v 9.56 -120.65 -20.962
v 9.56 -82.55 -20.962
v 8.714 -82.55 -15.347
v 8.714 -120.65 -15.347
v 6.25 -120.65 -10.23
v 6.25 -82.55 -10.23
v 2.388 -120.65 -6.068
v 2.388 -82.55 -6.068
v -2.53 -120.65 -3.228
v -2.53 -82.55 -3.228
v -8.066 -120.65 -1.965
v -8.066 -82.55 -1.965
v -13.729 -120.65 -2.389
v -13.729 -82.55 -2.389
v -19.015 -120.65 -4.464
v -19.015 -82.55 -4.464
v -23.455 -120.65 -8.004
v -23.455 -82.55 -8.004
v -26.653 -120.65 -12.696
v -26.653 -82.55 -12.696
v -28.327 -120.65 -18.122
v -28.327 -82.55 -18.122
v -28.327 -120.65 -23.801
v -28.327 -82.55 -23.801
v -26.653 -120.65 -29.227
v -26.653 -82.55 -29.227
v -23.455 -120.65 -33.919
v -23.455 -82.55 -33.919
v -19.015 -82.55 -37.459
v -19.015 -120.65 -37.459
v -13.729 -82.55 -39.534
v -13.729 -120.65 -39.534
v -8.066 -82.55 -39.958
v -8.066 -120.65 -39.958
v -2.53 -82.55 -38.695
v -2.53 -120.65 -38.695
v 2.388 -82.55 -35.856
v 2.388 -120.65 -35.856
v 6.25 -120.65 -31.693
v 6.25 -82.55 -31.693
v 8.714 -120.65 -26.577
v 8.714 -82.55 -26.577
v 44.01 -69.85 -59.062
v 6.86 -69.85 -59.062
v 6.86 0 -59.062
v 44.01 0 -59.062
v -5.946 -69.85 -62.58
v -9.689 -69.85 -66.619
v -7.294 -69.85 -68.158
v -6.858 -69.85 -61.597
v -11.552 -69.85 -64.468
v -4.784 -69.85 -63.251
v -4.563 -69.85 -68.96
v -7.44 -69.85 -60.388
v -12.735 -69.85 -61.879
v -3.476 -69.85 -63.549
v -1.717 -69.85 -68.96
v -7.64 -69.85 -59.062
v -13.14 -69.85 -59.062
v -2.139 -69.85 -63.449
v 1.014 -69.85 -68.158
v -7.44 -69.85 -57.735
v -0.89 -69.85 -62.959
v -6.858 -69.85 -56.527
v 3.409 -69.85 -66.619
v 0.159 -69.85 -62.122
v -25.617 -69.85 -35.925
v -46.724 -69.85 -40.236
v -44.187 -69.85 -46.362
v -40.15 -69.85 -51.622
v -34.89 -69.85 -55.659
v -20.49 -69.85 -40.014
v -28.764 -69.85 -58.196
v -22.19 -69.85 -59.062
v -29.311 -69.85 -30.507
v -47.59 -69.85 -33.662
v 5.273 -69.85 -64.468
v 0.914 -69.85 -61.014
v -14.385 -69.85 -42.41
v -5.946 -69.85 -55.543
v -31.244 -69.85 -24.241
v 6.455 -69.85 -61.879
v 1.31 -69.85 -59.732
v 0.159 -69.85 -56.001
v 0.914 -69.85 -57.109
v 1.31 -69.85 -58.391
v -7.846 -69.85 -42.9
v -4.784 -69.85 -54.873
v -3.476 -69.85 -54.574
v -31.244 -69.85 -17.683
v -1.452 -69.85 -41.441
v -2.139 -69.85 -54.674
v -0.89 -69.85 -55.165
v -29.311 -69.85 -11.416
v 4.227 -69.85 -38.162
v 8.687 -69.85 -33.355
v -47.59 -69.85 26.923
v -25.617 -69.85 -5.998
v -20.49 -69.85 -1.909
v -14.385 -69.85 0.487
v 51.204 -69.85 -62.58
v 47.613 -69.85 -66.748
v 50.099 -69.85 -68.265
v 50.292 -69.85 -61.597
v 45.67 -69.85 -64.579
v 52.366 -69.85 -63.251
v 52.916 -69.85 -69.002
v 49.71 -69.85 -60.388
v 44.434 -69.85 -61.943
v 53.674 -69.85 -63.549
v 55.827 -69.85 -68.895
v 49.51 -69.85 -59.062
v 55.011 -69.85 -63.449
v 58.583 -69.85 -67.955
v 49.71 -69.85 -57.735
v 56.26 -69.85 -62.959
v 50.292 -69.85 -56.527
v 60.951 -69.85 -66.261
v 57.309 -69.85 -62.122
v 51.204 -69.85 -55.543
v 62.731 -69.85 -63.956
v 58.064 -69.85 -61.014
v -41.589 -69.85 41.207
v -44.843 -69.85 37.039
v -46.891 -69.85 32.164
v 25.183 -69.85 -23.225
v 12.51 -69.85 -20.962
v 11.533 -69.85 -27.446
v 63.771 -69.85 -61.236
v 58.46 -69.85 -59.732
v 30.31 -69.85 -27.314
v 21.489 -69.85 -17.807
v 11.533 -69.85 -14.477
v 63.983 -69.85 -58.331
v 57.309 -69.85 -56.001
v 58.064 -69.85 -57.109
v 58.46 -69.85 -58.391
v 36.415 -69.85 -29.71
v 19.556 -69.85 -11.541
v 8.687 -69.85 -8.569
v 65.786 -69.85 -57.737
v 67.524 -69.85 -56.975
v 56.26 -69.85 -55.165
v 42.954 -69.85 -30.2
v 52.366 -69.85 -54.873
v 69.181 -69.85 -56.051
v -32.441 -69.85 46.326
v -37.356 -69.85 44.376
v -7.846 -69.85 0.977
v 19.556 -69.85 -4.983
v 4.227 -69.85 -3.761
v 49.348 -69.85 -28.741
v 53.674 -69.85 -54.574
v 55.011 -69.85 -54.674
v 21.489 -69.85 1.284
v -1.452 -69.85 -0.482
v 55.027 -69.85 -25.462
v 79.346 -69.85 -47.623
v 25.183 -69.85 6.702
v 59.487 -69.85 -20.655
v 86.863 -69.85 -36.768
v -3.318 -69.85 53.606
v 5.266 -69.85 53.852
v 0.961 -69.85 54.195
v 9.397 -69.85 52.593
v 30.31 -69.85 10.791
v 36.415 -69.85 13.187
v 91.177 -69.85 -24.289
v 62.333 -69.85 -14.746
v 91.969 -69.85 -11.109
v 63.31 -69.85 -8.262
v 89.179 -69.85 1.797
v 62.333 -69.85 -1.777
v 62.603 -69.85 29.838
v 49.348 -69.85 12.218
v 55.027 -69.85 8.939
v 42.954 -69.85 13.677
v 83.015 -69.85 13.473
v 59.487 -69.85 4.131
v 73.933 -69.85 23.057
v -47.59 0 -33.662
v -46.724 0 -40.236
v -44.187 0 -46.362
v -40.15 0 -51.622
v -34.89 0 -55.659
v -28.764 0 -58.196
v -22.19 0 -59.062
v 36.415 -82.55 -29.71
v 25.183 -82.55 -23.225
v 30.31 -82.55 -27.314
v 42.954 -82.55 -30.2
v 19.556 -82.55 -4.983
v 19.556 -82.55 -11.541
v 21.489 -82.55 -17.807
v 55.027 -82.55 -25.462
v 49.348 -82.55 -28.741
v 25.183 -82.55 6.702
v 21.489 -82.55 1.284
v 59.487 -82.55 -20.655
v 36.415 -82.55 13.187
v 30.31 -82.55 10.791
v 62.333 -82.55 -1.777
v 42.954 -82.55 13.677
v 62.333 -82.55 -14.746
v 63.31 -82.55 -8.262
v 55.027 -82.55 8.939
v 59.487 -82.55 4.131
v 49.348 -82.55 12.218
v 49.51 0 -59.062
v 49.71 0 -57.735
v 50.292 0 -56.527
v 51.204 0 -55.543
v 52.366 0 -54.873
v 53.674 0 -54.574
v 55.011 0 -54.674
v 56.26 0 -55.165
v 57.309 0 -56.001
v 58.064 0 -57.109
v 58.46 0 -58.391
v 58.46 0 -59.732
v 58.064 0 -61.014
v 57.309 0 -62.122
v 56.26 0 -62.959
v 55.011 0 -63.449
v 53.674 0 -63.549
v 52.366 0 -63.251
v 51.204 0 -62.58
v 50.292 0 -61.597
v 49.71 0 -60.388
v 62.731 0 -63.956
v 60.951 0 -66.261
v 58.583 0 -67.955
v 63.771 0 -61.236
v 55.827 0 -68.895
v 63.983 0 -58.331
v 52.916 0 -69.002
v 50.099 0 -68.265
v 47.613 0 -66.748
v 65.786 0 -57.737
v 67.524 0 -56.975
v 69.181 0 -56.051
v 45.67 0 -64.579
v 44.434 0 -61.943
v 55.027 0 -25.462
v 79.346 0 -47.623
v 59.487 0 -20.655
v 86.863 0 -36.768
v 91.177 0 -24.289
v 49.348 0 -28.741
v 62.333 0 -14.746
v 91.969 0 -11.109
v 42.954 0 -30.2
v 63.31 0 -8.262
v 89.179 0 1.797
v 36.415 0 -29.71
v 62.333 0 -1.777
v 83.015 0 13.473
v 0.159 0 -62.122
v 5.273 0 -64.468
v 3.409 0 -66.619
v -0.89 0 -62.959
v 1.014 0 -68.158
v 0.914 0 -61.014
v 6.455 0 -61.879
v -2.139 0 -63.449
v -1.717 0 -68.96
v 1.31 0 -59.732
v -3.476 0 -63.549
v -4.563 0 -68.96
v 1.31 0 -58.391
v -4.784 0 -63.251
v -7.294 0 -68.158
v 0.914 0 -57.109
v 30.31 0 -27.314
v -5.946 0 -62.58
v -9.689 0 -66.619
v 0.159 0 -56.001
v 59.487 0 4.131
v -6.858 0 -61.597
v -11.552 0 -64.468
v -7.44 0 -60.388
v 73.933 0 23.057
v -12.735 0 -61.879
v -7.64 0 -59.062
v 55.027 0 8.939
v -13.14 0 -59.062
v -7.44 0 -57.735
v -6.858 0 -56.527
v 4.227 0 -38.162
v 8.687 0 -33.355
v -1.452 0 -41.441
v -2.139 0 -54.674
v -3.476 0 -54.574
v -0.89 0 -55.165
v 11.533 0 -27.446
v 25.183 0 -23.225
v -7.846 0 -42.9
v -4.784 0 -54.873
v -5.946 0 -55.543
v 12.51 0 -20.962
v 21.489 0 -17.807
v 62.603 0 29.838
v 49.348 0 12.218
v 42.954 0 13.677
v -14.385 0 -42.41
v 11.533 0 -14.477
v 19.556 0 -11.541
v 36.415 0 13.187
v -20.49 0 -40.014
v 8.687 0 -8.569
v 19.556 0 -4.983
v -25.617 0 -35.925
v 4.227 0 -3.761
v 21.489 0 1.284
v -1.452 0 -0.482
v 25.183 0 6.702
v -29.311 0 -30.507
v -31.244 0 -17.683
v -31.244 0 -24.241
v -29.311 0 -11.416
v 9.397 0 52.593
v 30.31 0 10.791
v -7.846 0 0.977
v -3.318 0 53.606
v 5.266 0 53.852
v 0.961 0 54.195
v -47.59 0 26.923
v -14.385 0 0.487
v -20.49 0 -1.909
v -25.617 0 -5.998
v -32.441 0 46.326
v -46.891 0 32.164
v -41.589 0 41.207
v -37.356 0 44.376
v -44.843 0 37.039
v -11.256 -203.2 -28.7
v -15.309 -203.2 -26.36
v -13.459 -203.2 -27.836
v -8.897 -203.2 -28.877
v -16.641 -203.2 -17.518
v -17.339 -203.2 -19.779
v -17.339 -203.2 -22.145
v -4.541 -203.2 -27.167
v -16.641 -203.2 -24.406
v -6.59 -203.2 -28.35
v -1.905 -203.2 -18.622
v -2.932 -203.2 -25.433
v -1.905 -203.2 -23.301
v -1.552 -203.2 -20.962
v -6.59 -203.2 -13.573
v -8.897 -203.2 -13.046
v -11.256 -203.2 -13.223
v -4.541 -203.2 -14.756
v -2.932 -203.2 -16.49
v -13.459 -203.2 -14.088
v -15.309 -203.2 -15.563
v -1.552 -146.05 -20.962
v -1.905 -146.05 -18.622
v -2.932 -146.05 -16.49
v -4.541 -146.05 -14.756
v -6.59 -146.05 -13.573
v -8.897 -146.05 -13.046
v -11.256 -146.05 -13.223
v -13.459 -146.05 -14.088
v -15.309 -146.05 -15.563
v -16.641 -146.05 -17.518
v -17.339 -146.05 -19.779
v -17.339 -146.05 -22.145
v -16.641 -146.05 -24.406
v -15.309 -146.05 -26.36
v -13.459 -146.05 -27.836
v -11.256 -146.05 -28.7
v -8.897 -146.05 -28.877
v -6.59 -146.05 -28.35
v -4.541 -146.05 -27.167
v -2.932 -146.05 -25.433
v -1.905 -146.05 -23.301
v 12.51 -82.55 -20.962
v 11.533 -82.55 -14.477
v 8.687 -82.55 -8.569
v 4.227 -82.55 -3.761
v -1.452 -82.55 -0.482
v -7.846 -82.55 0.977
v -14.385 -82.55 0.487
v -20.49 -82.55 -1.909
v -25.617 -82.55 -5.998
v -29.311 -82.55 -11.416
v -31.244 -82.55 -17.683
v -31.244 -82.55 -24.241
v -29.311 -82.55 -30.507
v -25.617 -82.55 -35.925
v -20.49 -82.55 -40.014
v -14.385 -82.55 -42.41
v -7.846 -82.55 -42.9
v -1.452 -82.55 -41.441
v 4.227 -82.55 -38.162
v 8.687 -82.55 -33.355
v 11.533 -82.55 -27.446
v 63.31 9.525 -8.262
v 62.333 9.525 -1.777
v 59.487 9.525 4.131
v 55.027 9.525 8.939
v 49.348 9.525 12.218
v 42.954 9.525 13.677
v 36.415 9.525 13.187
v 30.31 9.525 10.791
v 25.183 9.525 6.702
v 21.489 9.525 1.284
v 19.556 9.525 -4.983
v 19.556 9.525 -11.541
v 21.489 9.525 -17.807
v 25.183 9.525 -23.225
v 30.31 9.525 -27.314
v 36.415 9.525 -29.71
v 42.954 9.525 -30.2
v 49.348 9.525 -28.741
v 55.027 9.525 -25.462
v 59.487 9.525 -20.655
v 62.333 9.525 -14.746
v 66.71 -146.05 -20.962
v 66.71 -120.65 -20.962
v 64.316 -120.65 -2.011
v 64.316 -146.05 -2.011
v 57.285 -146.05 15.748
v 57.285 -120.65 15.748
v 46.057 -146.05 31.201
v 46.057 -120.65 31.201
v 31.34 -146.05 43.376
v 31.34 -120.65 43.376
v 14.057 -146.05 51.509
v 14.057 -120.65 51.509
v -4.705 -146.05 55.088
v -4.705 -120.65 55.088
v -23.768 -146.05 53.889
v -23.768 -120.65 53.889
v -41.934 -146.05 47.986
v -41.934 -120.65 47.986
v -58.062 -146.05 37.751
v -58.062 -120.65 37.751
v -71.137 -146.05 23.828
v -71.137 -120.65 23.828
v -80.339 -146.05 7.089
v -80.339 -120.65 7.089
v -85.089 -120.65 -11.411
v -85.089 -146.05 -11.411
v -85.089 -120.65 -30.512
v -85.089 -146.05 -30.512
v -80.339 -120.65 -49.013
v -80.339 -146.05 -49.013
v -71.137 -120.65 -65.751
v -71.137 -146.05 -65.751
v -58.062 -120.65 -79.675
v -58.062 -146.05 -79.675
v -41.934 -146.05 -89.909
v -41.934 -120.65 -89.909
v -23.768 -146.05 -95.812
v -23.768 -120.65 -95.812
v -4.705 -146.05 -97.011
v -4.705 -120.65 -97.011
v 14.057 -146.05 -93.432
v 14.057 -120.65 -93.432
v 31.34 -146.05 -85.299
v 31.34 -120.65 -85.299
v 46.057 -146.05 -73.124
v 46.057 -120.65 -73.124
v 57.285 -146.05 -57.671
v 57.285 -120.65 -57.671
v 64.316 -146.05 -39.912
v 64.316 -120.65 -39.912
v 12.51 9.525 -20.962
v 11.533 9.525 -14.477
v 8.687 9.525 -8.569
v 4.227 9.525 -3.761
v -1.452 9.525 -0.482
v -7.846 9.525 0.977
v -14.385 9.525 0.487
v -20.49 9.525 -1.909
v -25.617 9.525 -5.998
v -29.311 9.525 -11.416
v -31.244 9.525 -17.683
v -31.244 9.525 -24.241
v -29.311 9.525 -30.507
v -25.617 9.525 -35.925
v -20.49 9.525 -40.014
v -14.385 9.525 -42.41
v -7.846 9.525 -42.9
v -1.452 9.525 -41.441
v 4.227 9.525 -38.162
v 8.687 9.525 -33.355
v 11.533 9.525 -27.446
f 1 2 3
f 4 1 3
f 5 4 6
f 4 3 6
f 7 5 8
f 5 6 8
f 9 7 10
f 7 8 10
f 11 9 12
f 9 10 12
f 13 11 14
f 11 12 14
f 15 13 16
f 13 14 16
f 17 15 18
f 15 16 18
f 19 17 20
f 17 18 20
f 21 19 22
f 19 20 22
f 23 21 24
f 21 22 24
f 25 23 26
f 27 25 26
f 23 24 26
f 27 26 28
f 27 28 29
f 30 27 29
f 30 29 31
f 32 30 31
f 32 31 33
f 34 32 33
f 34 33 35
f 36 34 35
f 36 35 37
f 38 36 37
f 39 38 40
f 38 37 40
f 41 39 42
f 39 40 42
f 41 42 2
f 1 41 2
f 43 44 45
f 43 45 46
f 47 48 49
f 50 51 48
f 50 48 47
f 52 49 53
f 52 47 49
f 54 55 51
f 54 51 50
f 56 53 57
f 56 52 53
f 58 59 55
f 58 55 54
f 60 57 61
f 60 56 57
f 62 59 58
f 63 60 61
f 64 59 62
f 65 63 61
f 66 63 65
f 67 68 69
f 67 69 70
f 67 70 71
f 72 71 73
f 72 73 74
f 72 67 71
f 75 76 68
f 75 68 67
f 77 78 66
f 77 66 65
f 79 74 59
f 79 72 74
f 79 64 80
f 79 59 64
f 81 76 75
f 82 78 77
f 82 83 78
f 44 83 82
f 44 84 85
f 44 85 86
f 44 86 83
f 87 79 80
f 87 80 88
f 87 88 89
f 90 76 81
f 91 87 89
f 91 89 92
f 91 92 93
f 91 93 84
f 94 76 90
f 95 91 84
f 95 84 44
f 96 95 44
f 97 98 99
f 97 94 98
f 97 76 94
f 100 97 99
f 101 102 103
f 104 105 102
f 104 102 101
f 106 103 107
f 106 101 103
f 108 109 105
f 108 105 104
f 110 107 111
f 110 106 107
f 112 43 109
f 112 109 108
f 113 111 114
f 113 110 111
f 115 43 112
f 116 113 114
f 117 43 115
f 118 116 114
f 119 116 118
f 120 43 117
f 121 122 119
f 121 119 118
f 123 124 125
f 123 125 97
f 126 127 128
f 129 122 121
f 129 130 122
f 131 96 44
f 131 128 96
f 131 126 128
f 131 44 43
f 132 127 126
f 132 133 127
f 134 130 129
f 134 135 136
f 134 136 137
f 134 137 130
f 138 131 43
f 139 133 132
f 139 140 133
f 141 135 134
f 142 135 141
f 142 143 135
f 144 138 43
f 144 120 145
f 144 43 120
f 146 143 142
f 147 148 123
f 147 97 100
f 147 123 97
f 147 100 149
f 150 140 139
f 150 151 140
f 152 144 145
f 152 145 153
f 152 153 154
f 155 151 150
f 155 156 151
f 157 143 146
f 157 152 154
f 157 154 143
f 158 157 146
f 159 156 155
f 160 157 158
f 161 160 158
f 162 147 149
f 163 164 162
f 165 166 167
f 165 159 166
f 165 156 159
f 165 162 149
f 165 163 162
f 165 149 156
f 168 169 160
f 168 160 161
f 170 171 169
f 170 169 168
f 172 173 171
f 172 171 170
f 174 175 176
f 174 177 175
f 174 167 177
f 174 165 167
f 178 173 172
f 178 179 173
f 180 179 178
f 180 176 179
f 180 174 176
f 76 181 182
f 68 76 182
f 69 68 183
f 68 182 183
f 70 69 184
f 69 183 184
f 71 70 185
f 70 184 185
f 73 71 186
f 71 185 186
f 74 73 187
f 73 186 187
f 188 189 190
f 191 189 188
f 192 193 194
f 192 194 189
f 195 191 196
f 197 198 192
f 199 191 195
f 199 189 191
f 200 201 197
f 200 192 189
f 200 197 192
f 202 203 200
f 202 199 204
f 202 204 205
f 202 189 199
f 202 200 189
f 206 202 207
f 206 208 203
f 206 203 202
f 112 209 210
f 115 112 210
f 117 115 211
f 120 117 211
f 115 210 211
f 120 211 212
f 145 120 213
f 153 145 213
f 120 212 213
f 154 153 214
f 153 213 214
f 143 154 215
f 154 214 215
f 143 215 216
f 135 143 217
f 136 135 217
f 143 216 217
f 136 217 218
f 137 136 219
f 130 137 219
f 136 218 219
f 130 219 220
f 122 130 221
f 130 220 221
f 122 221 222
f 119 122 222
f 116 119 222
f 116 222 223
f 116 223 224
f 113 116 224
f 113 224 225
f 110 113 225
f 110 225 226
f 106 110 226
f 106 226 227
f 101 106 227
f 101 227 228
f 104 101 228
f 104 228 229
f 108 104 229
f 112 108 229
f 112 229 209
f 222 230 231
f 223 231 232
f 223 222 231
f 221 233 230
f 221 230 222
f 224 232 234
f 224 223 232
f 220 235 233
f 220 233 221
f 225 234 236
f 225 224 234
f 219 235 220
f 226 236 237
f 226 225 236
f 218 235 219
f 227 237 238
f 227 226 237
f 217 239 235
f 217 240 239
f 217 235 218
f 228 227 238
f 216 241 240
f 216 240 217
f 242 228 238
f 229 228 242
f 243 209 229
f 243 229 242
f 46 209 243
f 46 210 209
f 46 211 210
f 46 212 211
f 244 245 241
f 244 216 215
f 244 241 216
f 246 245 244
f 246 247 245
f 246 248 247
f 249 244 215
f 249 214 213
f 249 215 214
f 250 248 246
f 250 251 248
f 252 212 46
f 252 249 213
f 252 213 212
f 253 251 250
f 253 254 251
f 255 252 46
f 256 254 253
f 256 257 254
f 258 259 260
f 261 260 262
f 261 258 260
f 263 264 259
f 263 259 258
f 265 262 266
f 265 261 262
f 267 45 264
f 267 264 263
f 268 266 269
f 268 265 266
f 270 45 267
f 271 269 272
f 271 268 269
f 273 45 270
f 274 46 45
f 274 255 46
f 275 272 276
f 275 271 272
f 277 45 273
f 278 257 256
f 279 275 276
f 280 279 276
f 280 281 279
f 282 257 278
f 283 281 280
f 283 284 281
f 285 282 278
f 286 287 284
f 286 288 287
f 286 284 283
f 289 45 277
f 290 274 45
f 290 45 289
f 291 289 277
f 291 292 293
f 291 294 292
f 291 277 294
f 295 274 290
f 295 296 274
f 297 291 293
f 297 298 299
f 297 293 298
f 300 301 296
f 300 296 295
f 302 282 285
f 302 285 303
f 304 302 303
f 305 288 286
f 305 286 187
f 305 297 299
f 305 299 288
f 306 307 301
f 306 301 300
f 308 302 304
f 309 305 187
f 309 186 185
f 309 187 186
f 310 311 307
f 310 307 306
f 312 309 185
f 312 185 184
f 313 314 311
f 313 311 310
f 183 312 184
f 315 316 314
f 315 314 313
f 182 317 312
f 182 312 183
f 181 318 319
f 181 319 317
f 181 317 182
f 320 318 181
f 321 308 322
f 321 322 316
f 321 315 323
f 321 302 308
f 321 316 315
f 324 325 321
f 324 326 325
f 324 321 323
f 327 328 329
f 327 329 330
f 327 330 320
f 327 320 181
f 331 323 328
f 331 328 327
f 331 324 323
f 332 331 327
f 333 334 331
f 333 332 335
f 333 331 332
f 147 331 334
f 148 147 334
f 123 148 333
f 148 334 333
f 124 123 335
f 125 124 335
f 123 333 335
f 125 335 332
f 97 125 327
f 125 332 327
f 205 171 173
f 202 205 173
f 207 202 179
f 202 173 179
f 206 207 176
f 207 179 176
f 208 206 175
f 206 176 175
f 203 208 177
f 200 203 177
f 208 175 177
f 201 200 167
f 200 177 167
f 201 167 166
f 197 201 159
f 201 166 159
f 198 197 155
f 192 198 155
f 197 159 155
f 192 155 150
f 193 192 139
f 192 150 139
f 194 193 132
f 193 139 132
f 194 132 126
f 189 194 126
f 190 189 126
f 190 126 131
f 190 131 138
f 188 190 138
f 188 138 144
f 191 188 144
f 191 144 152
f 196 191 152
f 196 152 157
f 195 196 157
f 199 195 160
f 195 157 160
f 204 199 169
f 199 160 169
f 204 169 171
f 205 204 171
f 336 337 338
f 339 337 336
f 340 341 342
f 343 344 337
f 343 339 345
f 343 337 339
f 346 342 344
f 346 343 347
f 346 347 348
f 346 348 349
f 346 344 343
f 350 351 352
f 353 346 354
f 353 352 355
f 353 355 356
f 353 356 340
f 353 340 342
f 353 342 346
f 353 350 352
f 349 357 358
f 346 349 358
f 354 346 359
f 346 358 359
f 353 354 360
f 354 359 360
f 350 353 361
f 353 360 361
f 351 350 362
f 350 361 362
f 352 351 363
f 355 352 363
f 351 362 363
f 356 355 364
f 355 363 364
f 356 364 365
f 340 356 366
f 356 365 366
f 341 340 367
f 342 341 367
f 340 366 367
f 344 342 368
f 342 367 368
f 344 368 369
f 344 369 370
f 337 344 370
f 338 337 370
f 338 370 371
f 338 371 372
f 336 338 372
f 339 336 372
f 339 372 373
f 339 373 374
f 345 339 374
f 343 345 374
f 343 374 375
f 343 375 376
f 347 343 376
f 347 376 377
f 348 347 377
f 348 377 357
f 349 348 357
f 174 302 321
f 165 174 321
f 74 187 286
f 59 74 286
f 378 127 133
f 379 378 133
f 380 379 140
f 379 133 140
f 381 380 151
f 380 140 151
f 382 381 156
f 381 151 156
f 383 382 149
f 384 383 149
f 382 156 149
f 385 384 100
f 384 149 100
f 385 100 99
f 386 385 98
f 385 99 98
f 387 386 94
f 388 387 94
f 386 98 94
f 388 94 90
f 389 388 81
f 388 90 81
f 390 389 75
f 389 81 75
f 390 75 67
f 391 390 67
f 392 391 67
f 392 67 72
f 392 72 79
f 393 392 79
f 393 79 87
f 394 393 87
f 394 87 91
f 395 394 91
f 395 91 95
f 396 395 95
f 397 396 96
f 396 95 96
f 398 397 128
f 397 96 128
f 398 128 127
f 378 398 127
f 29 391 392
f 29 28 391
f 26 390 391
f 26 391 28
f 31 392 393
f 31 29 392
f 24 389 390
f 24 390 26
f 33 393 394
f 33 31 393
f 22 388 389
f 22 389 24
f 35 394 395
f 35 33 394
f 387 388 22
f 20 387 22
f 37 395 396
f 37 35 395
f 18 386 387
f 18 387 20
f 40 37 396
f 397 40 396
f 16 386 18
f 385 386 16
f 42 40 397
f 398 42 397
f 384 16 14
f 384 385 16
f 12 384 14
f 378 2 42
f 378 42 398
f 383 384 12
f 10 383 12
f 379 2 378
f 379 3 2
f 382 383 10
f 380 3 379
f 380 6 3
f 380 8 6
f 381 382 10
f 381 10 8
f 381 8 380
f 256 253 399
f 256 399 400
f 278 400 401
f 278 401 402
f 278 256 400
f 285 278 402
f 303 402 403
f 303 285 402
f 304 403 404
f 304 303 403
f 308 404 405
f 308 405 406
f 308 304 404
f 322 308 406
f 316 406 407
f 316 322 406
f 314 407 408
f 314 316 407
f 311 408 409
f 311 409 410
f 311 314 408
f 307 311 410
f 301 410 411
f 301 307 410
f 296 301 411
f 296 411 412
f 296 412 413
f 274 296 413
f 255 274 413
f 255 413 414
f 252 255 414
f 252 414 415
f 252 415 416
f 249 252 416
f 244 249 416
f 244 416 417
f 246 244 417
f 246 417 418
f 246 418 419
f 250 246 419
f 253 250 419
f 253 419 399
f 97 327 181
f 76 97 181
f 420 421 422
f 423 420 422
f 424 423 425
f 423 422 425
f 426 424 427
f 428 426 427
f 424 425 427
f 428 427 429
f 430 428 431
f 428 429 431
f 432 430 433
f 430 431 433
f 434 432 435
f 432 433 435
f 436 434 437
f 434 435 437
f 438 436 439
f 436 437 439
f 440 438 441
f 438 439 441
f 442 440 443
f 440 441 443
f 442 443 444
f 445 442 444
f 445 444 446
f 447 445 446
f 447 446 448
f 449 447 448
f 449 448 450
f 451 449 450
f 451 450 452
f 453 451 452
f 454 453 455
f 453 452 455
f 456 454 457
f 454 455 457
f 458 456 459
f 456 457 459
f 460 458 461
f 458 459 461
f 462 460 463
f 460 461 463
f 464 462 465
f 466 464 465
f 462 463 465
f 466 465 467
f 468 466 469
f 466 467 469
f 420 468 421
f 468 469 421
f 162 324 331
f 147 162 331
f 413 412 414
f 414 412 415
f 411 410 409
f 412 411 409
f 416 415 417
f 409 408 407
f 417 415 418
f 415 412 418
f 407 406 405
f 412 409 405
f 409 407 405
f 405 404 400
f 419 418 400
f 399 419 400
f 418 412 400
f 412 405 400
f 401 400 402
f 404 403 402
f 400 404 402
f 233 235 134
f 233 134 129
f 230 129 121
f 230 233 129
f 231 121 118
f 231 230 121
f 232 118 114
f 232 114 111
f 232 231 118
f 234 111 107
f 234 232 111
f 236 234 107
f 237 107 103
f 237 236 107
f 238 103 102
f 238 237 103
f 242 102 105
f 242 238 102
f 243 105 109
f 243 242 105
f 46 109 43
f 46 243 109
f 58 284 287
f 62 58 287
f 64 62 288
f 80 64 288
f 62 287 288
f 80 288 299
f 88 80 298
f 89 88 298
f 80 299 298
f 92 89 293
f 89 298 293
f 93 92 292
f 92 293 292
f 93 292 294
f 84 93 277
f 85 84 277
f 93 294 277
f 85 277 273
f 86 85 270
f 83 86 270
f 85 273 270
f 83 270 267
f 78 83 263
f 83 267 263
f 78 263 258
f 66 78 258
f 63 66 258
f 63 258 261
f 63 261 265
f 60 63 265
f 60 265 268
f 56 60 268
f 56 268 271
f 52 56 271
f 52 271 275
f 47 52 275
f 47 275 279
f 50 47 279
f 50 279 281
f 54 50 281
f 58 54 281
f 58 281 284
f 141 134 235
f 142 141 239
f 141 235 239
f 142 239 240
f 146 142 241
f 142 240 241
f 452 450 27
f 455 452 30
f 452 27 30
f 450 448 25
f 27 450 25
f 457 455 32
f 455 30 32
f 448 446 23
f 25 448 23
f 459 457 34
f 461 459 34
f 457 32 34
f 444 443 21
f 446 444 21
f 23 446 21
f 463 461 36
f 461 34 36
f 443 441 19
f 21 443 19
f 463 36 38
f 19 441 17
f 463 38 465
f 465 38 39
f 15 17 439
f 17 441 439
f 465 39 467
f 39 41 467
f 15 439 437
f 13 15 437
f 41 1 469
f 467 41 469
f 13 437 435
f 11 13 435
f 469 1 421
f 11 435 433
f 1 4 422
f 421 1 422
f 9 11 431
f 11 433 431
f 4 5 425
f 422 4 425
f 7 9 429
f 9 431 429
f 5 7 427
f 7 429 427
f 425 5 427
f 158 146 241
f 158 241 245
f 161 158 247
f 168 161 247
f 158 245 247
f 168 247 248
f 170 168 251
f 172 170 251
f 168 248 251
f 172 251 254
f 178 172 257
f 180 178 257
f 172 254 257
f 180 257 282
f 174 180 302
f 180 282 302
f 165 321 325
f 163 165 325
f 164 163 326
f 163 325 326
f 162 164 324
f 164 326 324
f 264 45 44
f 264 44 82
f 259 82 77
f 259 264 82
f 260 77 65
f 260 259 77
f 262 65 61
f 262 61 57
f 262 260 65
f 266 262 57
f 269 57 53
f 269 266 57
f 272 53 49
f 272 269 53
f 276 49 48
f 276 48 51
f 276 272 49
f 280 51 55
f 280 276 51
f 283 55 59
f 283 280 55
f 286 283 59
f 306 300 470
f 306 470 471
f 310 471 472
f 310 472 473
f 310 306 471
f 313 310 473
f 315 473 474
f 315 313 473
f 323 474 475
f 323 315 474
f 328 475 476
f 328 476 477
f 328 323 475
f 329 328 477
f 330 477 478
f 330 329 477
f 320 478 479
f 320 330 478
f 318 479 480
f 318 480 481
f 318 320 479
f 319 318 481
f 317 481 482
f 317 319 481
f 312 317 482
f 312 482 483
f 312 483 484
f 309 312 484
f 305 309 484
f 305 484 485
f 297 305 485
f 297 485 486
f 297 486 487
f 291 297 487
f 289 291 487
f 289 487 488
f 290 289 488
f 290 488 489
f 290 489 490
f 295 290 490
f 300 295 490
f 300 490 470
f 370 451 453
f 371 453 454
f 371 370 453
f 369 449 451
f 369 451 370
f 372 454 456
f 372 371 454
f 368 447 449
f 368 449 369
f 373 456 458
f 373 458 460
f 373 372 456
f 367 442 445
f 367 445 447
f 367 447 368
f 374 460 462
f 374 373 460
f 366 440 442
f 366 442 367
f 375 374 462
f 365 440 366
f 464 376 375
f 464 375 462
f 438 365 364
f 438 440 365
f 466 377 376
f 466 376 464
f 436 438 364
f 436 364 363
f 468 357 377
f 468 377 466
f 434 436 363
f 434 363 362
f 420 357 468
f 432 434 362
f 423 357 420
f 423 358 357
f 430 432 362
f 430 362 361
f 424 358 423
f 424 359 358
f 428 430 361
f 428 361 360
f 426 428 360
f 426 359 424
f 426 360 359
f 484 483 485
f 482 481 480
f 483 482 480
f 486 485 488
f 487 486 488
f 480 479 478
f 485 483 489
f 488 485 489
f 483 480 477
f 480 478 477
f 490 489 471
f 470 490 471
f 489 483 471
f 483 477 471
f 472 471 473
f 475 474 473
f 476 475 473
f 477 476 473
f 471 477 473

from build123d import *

# Parameters (mm, degrees)
F1_DEPTH      = 69.85
F2_R          = 22
F3_DEPTH      = 79.375
F3_DEPTH_BACK = 12.7
F4_R          = 10
F5_DEPTH      = 69.85
F6_R          = 4.5
F7_DEPTH      = 82.551
F8_R          = 19.05
F9_DEPTH      = 38.1
F10_R         = 7.9375
F11_DEPTH     = 82.55
F12_R         = 76.2
F13_DEPTH     = 25.4


# Not quite as in the source:
# - a length typed as a fraction of an inch, garbled in the dataset ("3 / 203.2 mm" for 3/8 in), is restored


with BuildPart() as f1:
    # F0 (on Front) → F1 (new body)
    with BuildSketch(Plane.XZ):
        with BuildLine():
            ThreePointArc((-32.4406404125, 46.3256966582), (-43.3540366721, 39.2310908433), (-47.5899279118, 26.9228466552))
            Line((-47.5899279118, 26.9228466552), (-47.5899279118, -33.6616252167))
            ThreePointArc((-47.5899279118, -33.6616252167), (-40.1504401539, -51.6221374588), (-22.1899279118, -59.0616252167))
            Line((-22.1899279118, -59.0616252167), (58.6284401518, -59.0616252167))
            ThreePointArc((58.6284401518, -59.0616252167), (64.1154300354, -58.2942262372), (69.1813488754, -56.0509194183))
            ThreePointArc((69.1813488754, -56.0509194183), (91.9687648373, -11.1091837062), (62.6034215093, 29.8383747833))
            Line((62.6034215093, 29.8383747833), (9.3969636816, 52.592505372))
            ThreePointArc((9.3969636816, 52.592505372), (3.1225085413, 54.1402430548), (-3.3179311218, 53.6063739808))
            Line((-3.3179311218, 53.6063739808), (-32.4406404125, 46.3256966582))
        make_face()
    extrude(amount=F1_DEPTH)

    # F2 (on face) → F3 (join, two sides)
    with BuildSketch(Plane.XZ.offset(69.85)) as f3_sk:
        with Locations((-9.4899279118, -20.9616252167)):
            Circle(F2_R)
        with Locations((41.3100720882, -8.2616252167)):
            Circle(F2_R)
    extrude(amount=-F3_DEPTH)
    extrude(f3_sk.sketch, amount=F3_DEPTH_BACK)

    # F4 (on face) → F5 (join, through all)
    with BuildSketch(Plane(origin=(0, 0, 0), x_dir=(-1, 0, 0), z_dir=(0, 1, 0))):
        with Locations((-54.0100720882, -59.0616252167)):
            Circle(F4_R)
        with Locations((3.1399279118, -59.0616252167)):
            Circle(F4_R)
    extrude(amount=-F5_DEPTH)

    # F6 (on face) → F7 (cut, through all)
    with BuildSketch(Plane(origin=(0, 0, 0), x_dir=(-1, 0, 0), z_dir=(0, 1, 0))):
        with Locations((-54.0100720882, -59.0616252167)):
            Circle(F6_R)
        with Locations((3.1399279118, -59.0616252167)):
            Circle(F6_R)
    extrude(amount=-F7_DEPTH, mode=Mode.SUBTRACT)

    # F8 (on face) → F9 (join)
    with BuildSketch(Plane.XZ.offset(82.55)):
        with Locations((-9.4899279118, -20.9616252167)):
            Circle(F8_R)
    extrude(amount=F9_DEPTH)

    # F10 (on face) → F11 (join)
    with BuildSketch(Plane.XZ.offset(120.65)):
        with Locations((-9.4899279118, -20.9616252167)):
            Circle(F10_R)
    extrude(amount=F11_DEPTH)

    # F12 (on face) → F13 (join)
    with BuildSketch(Plane.XZ.offset(120.65)):
        with Locations((-9.4899279118, -20.9616252167)):
            Circle(F12_R)
    extrude(amount=F13_DEPTH)


solid = f1.part
